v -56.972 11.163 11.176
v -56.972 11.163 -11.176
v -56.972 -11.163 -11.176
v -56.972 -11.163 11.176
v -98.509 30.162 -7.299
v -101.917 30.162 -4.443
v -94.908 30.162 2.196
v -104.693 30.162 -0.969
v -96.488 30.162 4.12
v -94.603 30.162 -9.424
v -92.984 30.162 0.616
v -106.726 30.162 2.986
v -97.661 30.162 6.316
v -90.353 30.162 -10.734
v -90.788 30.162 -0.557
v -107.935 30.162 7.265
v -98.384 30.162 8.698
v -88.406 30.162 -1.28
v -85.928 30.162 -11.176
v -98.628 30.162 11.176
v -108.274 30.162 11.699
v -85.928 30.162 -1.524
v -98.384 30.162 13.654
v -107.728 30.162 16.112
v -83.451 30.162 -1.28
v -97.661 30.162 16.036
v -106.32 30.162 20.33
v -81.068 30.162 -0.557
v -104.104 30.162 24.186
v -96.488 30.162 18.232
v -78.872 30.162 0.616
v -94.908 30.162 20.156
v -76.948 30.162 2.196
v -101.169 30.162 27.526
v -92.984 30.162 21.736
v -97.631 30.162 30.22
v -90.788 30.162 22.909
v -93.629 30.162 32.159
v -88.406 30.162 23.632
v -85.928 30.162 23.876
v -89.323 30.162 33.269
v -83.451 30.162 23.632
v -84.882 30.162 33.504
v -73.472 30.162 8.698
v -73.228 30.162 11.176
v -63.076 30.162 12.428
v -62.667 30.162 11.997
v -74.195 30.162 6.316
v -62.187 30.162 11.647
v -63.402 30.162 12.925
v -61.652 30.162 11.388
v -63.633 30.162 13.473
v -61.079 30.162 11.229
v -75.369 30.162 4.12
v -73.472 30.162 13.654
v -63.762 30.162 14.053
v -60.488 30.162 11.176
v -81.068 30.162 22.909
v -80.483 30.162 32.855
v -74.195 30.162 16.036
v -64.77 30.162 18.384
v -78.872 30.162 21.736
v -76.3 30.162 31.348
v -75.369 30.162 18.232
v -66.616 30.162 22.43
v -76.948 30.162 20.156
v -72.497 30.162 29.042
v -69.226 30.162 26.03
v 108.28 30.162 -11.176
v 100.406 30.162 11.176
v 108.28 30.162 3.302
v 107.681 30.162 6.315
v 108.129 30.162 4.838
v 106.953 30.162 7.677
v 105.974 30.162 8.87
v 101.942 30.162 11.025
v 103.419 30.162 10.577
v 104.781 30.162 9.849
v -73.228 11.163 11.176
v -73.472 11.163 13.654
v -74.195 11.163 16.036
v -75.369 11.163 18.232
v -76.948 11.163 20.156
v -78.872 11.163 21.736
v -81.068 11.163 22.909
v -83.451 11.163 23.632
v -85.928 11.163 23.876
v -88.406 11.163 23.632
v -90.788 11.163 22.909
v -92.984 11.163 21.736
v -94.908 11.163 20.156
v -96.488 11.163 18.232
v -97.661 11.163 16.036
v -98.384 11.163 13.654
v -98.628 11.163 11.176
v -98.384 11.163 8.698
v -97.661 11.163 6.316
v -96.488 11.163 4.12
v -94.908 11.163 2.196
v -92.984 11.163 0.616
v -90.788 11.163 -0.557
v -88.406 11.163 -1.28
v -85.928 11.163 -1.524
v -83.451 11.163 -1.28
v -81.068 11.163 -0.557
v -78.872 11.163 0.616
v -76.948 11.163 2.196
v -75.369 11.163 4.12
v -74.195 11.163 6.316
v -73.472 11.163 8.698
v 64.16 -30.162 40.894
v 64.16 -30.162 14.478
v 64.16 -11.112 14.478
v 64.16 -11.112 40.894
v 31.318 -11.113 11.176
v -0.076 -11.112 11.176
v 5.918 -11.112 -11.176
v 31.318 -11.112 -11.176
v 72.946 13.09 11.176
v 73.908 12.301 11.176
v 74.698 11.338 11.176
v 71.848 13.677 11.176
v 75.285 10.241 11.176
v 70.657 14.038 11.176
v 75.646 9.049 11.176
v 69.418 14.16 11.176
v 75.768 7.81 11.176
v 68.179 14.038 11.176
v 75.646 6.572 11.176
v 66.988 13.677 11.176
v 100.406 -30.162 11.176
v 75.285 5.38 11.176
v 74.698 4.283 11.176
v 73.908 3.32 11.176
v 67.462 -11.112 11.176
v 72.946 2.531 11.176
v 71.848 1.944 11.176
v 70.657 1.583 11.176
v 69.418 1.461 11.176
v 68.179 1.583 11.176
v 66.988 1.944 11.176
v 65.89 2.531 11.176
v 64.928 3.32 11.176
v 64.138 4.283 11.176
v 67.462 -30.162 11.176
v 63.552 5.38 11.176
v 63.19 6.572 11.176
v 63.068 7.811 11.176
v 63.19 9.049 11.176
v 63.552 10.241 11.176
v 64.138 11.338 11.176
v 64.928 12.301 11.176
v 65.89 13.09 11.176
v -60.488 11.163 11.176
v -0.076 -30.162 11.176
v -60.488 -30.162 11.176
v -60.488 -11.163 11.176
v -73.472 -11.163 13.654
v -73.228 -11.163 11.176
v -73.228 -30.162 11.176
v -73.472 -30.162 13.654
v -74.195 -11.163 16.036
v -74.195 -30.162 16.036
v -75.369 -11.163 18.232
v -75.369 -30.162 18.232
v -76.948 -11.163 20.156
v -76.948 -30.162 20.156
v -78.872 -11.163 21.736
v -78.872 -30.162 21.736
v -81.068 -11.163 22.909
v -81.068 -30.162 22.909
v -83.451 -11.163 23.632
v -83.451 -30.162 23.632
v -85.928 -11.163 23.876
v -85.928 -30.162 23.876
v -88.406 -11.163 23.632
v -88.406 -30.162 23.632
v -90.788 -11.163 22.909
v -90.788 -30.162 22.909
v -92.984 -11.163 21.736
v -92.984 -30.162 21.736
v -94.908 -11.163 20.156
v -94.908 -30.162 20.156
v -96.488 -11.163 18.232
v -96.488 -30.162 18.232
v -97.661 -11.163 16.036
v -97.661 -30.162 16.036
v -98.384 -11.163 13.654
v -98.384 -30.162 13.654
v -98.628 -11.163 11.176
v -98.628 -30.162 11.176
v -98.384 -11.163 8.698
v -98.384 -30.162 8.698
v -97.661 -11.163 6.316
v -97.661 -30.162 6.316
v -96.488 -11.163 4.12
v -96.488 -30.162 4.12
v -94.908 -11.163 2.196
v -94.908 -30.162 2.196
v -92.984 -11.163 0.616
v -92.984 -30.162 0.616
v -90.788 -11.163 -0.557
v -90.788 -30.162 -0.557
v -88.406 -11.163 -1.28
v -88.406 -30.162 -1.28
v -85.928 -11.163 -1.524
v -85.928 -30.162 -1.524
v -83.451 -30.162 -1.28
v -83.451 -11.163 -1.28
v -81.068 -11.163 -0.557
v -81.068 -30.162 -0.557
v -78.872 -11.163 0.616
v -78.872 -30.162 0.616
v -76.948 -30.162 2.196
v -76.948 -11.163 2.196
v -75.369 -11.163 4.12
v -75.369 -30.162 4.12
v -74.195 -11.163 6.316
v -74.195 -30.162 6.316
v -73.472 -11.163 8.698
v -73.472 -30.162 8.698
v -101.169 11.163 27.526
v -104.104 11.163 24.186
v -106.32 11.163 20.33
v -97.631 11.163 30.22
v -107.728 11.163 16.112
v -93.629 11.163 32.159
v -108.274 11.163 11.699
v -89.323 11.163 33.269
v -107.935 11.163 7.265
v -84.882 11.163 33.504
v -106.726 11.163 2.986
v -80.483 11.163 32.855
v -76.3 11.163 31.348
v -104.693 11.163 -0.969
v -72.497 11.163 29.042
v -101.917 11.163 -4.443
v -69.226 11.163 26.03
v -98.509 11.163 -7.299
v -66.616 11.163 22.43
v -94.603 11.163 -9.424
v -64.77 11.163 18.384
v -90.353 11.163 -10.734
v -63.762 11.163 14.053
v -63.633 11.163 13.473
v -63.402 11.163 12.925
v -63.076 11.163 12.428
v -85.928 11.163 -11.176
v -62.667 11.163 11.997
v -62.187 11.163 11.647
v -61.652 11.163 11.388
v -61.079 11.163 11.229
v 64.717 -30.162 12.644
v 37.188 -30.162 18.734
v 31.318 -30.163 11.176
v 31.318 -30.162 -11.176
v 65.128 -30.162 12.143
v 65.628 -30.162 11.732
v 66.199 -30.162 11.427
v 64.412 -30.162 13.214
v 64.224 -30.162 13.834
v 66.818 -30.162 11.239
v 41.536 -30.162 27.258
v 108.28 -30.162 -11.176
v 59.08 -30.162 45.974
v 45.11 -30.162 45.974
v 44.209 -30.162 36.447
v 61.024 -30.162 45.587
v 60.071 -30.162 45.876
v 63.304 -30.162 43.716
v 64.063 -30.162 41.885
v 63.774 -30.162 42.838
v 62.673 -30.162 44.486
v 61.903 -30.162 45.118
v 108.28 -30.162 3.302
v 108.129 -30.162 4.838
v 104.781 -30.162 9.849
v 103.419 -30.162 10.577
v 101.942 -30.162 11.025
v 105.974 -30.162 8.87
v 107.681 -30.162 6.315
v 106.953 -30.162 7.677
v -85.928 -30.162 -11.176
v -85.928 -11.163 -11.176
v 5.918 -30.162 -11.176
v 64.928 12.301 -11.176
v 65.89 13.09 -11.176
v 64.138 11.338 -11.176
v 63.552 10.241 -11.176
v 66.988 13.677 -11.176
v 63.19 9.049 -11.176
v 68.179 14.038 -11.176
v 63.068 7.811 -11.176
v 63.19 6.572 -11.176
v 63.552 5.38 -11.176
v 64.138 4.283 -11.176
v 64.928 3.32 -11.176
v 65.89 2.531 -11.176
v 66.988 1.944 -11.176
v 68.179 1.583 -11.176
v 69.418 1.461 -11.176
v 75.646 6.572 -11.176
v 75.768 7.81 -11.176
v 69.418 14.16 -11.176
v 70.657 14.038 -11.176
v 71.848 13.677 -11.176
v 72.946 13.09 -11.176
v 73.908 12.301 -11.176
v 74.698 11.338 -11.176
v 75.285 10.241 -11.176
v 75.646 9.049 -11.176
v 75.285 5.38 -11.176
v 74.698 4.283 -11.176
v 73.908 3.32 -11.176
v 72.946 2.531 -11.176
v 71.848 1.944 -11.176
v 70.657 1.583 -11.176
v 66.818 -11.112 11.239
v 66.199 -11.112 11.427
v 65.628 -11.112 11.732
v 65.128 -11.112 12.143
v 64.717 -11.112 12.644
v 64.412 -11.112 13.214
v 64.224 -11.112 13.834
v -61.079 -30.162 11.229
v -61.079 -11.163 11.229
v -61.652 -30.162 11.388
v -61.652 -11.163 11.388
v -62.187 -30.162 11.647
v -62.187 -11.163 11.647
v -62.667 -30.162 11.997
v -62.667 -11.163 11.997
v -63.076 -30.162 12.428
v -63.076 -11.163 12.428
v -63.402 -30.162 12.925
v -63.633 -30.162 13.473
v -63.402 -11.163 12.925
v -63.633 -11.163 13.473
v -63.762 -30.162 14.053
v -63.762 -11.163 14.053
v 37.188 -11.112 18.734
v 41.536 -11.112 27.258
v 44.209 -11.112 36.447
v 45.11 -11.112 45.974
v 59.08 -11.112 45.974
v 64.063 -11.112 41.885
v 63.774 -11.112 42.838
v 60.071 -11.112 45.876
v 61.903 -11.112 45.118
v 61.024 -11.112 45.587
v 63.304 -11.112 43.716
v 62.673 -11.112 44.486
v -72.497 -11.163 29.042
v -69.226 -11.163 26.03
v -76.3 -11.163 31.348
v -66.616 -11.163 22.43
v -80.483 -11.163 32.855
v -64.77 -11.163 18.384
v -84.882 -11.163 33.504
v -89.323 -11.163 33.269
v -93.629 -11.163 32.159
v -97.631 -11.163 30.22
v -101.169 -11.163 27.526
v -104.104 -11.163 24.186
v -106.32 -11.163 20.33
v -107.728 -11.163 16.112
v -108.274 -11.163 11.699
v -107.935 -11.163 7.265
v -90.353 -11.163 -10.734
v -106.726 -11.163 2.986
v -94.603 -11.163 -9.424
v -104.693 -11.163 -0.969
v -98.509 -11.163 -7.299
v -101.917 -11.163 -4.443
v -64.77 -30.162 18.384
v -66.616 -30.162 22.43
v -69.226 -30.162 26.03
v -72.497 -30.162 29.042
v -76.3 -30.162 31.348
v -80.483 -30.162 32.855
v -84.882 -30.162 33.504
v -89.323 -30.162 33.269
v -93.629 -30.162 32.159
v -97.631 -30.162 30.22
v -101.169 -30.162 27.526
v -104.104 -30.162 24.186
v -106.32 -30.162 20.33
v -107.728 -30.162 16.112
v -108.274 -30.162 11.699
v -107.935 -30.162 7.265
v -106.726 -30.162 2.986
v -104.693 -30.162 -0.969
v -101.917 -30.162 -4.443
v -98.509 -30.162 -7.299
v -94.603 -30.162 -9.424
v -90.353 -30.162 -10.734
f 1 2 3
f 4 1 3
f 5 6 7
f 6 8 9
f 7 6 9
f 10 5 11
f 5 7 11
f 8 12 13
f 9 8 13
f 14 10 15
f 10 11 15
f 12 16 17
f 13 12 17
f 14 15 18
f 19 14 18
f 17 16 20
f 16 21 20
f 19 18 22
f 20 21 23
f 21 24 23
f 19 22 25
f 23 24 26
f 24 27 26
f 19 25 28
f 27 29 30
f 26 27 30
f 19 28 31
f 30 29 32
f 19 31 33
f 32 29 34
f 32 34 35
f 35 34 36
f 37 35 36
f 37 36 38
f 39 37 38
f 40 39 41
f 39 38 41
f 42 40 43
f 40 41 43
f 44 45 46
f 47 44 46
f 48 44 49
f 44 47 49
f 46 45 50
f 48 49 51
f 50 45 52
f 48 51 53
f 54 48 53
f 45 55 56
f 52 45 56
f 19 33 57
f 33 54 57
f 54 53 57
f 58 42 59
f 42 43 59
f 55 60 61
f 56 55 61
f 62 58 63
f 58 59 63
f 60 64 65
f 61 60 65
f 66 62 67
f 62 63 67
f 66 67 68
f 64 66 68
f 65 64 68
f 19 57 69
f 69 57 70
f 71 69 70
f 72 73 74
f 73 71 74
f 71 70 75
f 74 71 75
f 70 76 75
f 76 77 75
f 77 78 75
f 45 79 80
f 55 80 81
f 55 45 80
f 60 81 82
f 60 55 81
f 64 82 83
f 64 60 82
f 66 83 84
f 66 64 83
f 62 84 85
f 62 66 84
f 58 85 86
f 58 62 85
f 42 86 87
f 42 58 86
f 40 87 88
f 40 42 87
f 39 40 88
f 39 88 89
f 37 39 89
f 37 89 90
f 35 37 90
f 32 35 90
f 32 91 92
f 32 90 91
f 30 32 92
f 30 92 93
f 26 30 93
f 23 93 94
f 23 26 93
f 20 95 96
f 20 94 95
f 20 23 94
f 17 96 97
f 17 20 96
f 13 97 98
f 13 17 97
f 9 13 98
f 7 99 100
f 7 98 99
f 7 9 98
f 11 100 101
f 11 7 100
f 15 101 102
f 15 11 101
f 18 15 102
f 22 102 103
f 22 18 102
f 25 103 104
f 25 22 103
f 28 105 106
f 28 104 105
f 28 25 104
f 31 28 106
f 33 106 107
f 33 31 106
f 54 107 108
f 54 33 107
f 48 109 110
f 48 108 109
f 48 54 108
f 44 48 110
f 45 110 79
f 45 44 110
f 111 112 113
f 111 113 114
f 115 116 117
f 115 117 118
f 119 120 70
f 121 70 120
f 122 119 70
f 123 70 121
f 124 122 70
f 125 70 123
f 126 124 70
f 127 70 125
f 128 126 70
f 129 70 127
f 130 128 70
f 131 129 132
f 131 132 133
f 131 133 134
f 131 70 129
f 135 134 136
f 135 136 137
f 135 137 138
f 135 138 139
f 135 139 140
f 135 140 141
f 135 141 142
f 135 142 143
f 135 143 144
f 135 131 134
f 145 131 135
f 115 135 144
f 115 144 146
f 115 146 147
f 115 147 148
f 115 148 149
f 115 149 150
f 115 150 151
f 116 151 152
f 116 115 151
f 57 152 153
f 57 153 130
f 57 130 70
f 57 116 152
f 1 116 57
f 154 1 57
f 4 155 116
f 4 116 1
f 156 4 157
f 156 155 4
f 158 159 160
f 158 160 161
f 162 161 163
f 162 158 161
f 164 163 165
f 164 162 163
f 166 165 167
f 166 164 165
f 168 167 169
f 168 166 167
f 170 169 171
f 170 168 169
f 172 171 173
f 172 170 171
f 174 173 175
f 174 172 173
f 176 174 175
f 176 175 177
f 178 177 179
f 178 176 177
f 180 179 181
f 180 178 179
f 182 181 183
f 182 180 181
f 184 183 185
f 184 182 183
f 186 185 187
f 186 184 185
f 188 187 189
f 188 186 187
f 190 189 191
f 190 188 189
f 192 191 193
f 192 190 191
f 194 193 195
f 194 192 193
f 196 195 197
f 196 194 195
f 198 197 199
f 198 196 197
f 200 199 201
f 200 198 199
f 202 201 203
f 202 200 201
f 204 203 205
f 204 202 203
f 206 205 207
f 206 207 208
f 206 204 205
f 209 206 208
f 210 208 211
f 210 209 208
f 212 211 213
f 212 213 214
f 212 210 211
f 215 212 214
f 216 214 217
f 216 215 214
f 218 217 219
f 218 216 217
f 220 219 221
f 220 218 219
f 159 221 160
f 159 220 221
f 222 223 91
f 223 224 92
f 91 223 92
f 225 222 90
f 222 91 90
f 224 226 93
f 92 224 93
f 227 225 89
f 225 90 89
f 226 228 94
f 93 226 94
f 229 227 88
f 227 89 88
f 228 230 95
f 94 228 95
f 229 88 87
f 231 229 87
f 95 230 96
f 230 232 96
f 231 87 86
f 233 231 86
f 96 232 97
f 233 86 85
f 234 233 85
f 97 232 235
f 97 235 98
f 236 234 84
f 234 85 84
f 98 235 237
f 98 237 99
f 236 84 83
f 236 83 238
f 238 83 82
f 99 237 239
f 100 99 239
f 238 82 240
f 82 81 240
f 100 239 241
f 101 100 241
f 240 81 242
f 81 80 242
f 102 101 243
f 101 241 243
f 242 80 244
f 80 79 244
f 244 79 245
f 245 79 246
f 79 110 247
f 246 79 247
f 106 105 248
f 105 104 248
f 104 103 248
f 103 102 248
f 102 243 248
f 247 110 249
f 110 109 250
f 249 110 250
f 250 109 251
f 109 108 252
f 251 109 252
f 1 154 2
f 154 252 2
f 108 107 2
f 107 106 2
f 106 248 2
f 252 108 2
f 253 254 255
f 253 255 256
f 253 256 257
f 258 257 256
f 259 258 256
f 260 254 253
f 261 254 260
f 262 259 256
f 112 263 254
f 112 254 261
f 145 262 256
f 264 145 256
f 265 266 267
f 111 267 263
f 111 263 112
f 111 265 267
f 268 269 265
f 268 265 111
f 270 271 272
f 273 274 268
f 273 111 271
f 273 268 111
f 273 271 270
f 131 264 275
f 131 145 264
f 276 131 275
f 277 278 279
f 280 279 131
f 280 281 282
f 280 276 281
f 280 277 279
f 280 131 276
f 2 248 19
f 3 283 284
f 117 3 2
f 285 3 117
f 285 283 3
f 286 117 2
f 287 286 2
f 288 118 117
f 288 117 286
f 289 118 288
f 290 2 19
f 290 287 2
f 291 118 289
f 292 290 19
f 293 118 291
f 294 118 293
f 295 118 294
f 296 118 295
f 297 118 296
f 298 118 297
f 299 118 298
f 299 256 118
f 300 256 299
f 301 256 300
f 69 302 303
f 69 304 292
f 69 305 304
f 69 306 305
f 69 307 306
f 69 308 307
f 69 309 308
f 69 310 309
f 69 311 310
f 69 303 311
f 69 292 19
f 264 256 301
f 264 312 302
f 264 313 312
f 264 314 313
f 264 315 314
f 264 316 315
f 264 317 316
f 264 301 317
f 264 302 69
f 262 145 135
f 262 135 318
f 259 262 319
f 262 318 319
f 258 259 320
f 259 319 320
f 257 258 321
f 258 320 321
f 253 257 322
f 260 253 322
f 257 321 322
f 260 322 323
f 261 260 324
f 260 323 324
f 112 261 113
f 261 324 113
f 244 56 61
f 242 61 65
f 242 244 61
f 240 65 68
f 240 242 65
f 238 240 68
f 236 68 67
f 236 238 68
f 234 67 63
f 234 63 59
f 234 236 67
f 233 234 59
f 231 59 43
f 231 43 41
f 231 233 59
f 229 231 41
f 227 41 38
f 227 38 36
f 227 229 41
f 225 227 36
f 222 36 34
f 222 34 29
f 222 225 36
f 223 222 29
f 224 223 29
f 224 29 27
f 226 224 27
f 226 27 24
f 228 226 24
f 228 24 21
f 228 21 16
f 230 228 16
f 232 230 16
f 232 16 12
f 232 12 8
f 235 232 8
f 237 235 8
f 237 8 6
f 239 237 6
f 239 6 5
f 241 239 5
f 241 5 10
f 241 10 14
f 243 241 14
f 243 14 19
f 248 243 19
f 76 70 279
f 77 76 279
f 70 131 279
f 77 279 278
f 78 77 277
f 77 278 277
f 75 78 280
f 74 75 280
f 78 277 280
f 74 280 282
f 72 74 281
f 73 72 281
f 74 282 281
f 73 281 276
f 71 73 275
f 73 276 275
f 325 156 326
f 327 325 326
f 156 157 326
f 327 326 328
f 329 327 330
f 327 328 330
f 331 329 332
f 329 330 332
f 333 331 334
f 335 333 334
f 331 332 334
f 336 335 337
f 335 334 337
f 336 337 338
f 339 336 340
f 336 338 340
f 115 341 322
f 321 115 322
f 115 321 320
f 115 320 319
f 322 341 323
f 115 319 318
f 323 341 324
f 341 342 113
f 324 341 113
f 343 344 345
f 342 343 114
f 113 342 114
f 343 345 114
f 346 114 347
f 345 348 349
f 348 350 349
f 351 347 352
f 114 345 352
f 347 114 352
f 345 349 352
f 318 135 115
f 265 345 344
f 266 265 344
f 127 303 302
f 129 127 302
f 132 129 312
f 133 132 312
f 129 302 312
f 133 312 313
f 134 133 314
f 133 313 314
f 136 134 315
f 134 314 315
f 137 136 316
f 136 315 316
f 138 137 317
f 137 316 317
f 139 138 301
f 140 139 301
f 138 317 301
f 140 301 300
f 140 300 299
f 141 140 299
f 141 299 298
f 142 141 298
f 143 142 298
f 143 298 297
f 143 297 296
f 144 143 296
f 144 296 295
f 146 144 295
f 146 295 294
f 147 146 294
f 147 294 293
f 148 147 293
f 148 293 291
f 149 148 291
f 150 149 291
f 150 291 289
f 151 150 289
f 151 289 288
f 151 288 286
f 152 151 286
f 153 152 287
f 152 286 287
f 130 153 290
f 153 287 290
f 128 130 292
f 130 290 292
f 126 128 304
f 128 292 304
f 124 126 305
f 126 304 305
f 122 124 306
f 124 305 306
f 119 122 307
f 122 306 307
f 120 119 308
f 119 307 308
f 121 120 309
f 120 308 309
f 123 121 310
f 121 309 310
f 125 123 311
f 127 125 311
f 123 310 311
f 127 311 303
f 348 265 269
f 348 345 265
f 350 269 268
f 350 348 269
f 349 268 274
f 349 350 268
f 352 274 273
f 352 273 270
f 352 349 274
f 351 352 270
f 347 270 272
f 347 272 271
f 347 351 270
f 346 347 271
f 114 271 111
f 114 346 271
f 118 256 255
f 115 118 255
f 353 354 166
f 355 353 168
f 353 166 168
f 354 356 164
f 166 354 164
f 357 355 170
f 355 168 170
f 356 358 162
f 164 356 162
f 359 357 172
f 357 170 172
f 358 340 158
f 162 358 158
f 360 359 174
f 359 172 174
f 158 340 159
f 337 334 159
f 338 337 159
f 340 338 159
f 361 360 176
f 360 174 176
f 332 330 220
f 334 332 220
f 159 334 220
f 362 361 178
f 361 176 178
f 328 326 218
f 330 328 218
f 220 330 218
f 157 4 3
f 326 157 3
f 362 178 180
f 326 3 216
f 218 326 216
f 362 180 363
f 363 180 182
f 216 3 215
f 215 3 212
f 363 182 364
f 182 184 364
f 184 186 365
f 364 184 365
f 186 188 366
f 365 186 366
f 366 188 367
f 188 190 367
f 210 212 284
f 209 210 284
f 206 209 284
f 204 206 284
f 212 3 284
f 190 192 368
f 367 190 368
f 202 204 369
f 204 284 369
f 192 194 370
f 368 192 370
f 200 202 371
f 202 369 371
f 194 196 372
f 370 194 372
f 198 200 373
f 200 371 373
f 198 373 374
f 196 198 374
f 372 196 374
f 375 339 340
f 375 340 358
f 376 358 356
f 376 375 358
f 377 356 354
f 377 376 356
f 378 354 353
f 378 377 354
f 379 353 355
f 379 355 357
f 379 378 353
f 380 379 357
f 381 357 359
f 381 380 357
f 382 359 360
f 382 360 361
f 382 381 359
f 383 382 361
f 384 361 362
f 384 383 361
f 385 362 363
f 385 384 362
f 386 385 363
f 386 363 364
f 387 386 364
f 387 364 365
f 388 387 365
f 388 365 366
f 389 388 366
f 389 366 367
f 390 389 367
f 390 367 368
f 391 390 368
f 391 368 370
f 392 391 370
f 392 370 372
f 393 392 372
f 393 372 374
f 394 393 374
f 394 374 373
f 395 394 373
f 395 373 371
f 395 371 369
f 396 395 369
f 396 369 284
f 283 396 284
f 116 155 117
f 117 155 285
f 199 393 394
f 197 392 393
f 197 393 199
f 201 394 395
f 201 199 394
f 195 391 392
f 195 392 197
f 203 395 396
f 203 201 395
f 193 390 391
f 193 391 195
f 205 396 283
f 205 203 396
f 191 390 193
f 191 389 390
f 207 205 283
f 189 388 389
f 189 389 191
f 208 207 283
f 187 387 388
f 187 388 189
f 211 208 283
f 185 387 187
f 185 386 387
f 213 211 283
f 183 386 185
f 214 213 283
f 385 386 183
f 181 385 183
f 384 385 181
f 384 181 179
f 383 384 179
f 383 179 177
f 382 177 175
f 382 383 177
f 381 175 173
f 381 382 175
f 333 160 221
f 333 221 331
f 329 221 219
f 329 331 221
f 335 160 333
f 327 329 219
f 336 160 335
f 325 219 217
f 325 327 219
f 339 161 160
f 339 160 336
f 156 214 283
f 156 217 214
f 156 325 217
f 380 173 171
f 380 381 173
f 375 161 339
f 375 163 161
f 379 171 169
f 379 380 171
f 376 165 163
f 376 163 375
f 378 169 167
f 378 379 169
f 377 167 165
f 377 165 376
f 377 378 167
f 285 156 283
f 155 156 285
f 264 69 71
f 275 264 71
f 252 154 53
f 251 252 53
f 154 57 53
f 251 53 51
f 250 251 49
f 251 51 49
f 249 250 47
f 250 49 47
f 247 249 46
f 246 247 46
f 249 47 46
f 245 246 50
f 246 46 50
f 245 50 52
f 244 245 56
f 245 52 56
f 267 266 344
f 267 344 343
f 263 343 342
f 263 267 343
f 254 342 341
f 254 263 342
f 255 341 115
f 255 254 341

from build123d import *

# Parameters (mm, degrees)
F0_R     = 12.7
F1_DEPTH = 30.1625
F2_W     = 28.956
F2_H     = 22.3266
F2_R     = 6.35
F3_DEPTH = 44.705
F5_DEPTH = 19.05
F7_DEPTH = 19.05
F8_R     = 3.302
F9_R     = 7.874
F10_R    = 3.302
F11_R    = 5.08


with BuildPart() as f1:
    # F0 (on Front) → F1 (new body, symmetric)
    with BuildSketch(Plane.XZ):
        with BuildLine():
            Line((-85.9282, -11.176), (108.2802, -11.176))
            Line((108.2802, -11.176), (108.2802, 11.176))
            Line((108.2802, 11.176), (-63.5762, 11.176))
            ThreePointArc((-63.5762, 11.176), (-101.733451, 26.981251), (-85.9282, -11.176))
        make_face()
        with Locations((-85.9282, 11.176)):
            Circle(F0_R, mode=Mode.SUBTRACT)
    extrude(amount=F1_DEPTH, both=True)

    # F2 (on face) → F3 (cut, through all)
    with BuildSketch(Plane(origin=(0, 0, -11.176), x_dir=(1, 0, 0), z_dir=(0, 0, -1))):
        with Locations((-100.4062, 0)):
            Rectangle(F2_W, F2_H)
        with Locations((69.4182, -7.8105)):
            Circle(F2_R)
        with Locations((-71.4502, 0)):
            Rectangle(F2_W, F2_H)
    extrude(amount=-F3_DEPTH, mode=Mode.SUBTRACT)

    # F4 (on face) → F5 (cut)
    with BuildSketch(Plane.XZ.offset(30.1625)):
        Polygon((31.3182, -11.176), (31.3182, 11.176), (-0.0762, 11.176), (5.9182, -11.176), align=None)
    extrude(amount=-F5_DEPTH, mode=Mode.SUBTRACT)

    # F6 (on face) → F7 (join)
    with BuildSketch(Plane.XZ.offset(30.1625)):
        with BuildLine():
            Line((31.3182, 9.144), (45.1104, 9.144))
            Line((45.1104, 9.144), (64.1604, 9.144))
            Line((64.1604, 9.144), (64.1604, 45.974))
            Line((64.1604, 45.974), (45.1104, 45.974))
            ThreePointArc((45.1104, 45.974), (41.536215, 27.258358), (31.3182, 11.176))
            Line((31.3182, 11.176), (31.3182, 9.144))
        make_face()
    extrude(amount=-F7_DEPTH)

    # F8
    f8_edges = [f1.edges().sort_by_distance(p)[0] for p in [
        (-63.5762, -20.6629, 11.176),
        (-63.5762, 20.6629, 11.176),
    ]]
    fillet(f8_edges, radius=F8_R)

    # F9
    f9_edges = [f1.edges().sort_by_distance(p)[0] for p in [
        (108.2802, 0, 11.176),
    ]]
    fillet(f9_edges, radius=F9_R)

    # F10
    f10_edges = [f1.edges().sort_by_distance(p)[0] for p in [
        (64.1604, -20.6375, 11.176),
    ]]
    fillet(f10_edges, radius=F10_R)

    # F11
    f11_edges = [f1.edges().sort_by_distance(p)[0] for p in [
        (64.1604, -20.6375, 45.974),
    ]]
    fillet(f11_edges, radius=F11_R)


solid = f1.part
